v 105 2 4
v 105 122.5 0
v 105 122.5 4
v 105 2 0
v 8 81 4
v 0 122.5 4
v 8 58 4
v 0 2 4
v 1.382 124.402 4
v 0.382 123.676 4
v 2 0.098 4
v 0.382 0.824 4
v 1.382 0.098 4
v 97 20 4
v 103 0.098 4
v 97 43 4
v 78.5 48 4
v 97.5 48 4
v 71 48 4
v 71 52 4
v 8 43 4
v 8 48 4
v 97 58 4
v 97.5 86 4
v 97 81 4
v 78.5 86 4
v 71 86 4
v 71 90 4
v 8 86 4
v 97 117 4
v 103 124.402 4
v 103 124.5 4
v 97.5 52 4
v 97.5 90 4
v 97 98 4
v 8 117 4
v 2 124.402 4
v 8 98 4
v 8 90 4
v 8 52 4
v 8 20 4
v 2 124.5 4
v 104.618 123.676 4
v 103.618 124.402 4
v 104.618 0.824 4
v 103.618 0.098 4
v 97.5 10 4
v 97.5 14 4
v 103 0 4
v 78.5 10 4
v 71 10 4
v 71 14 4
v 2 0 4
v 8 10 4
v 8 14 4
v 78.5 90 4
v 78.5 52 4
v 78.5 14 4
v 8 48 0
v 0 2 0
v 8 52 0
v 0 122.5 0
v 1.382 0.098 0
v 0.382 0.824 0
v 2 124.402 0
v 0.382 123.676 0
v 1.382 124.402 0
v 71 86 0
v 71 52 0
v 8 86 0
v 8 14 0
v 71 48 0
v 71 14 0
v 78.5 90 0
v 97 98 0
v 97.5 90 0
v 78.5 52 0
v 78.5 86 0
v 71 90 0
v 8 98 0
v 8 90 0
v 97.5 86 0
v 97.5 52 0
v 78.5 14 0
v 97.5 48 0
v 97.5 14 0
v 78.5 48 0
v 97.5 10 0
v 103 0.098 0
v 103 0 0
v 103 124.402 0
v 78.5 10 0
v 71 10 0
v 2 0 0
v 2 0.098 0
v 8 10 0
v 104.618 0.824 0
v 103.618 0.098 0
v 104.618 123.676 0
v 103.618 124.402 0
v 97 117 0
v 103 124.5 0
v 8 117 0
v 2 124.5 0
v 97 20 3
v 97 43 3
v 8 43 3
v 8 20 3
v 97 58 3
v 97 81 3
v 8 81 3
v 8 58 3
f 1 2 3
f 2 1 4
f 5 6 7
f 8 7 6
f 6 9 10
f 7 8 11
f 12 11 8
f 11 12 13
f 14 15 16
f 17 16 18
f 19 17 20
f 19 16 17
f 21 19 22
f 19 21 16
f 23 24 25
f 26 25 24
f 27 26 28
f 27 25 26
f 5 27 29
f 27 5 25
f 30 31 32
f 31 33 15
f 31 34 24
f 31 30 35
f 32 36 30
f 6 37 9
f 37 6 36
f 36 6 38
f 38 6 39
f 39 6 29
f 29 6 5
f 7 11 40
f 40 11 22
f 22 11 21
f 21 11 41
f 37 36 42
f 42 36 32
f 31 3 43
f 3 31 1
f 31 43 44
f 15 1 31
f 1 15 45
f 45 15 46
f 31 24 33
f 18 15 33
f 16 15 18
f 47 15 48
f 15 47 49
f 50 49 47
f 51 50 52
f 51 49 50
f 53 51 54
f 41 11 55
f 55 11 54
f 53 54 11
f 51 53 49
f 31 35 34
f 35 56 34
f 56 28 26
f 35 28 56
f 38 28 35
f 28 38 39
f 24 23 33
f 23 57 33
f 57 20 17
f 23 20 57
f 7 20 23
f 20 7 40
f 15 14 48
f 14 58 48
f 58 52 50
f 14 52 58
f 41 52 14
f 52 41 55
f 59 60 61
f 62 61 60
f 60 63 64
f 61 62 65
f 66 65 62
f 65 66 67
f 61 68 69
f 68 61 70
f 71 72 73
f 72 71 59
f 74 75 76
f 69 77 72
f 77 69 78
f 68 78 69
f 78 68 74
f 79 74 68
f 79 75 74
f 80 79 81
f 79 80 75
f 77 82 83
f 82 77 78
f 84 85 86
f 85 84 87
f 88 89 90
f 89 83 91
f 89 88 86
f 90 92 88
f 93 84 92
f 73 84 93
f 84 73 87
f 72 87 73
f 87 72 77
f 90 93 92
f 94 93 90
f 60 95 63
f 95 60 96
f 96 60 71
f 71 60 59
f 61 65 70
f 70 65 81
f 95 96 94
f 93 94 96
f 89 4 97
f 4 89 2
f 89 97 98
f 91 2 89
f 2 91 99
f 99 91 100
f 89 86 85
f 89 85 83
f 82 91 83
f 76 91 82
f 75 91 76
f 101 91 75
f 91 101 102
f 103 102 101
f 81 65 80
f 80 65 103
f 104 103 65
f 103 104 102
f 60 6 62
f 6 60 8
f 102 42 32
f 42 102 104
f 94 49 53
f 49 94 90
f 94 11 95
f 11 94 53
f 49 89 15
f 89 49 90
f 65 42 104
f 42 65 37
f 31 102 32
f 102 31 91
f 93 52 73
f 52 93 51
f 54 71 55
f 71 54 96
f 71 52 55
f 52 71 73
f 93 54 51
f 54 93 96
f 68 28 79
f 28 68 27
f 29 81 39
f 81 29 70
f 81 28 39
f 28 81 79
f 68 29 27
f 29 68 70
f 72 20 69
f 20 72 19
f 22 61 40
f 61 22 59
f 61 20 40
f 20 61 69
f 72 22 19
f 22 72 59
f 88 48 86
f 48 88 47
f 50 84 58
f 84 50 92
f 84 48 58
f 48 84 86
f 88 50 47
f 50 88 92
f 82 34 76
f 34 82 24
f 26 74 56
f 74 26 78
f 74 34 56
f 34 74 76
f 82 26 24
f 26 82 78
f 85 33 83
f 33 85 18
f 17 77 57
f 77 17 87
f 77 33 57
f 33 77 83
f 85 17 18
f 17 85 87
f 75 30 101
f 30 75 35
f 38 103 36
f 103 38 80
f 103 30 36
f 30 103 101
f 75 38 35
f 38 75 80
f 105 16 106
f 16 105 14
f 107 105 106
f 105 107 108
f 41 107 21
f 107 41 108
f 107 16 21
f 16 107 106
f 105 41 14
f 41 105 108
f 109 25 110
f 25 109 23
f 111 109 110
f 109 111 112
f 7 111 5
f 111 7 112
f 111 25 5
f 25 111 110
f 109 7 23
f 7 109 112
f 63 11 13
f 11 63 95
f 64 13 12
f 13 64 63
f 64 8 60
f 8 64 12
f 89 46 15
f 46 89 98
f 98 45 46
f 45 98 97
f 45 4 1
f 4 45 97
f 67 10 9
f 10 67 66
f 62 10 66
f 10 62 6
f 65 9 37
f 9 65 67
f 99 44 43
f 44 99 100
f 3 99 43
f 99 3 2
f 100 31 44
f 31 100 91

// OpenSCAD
$fn=10; //TO warto dodać na poczatku zawsze im większa liczba tym więcej wierzchołków w figurach więc są bardizej wygładzone, ale dłuzej renderuje
// stałe
a = 37; //szerokość

c = 4; //wysokość


s = 9;//pozycja sygnatury
y = 21;
g = 3;
r = 1;//rozmiar


difference () {
cube([3*a-6,124.5,c]);
    translate([0,0,0])
    cube([2,2,c]);
    translate([3*a-6-2,0,0])
    cube([2,2,c]);
    translate([0,124.5-2,0])
    cube([2,2,c]);
    translate([3*a-6-2,124.5-2,0])
    cube([2,2,c]);
    translate([8,10,0])
    cube([71-8,4,4]);
    translate([8,86,0])
    cube([71-8,4,4]);
    translate([8,48,0])
    cube([71-8,4,4]);
    translate([71+7.5,10,0])
    cube([19,4,4]);
    translate([71+7.5,86,0])
    cube([19,4,4]);
    translate([71+7.5,48,0])
    cube([19,4,4]);
    
    translate([8,98,0])
    cube([3*a-6-8-8,19,4]);
    
    translate([8,20,3])
    cube([3*a-6-8-8,23,1]);
    translate([8,58,3])
    cube([3*a-6-8-8,23,1]);
}
//zaokrąglenia
translate([2,2,0])
cylinder(d=4,h=4);
translate([3*a-6-2,2,0])
cylinder(d=4,h=4);
translate([2,124.5-2,0])
cylinder(d=4,h=4);
translate([3*a-6-2,124.5-2,0])
cylinder(d=4,h=4);
